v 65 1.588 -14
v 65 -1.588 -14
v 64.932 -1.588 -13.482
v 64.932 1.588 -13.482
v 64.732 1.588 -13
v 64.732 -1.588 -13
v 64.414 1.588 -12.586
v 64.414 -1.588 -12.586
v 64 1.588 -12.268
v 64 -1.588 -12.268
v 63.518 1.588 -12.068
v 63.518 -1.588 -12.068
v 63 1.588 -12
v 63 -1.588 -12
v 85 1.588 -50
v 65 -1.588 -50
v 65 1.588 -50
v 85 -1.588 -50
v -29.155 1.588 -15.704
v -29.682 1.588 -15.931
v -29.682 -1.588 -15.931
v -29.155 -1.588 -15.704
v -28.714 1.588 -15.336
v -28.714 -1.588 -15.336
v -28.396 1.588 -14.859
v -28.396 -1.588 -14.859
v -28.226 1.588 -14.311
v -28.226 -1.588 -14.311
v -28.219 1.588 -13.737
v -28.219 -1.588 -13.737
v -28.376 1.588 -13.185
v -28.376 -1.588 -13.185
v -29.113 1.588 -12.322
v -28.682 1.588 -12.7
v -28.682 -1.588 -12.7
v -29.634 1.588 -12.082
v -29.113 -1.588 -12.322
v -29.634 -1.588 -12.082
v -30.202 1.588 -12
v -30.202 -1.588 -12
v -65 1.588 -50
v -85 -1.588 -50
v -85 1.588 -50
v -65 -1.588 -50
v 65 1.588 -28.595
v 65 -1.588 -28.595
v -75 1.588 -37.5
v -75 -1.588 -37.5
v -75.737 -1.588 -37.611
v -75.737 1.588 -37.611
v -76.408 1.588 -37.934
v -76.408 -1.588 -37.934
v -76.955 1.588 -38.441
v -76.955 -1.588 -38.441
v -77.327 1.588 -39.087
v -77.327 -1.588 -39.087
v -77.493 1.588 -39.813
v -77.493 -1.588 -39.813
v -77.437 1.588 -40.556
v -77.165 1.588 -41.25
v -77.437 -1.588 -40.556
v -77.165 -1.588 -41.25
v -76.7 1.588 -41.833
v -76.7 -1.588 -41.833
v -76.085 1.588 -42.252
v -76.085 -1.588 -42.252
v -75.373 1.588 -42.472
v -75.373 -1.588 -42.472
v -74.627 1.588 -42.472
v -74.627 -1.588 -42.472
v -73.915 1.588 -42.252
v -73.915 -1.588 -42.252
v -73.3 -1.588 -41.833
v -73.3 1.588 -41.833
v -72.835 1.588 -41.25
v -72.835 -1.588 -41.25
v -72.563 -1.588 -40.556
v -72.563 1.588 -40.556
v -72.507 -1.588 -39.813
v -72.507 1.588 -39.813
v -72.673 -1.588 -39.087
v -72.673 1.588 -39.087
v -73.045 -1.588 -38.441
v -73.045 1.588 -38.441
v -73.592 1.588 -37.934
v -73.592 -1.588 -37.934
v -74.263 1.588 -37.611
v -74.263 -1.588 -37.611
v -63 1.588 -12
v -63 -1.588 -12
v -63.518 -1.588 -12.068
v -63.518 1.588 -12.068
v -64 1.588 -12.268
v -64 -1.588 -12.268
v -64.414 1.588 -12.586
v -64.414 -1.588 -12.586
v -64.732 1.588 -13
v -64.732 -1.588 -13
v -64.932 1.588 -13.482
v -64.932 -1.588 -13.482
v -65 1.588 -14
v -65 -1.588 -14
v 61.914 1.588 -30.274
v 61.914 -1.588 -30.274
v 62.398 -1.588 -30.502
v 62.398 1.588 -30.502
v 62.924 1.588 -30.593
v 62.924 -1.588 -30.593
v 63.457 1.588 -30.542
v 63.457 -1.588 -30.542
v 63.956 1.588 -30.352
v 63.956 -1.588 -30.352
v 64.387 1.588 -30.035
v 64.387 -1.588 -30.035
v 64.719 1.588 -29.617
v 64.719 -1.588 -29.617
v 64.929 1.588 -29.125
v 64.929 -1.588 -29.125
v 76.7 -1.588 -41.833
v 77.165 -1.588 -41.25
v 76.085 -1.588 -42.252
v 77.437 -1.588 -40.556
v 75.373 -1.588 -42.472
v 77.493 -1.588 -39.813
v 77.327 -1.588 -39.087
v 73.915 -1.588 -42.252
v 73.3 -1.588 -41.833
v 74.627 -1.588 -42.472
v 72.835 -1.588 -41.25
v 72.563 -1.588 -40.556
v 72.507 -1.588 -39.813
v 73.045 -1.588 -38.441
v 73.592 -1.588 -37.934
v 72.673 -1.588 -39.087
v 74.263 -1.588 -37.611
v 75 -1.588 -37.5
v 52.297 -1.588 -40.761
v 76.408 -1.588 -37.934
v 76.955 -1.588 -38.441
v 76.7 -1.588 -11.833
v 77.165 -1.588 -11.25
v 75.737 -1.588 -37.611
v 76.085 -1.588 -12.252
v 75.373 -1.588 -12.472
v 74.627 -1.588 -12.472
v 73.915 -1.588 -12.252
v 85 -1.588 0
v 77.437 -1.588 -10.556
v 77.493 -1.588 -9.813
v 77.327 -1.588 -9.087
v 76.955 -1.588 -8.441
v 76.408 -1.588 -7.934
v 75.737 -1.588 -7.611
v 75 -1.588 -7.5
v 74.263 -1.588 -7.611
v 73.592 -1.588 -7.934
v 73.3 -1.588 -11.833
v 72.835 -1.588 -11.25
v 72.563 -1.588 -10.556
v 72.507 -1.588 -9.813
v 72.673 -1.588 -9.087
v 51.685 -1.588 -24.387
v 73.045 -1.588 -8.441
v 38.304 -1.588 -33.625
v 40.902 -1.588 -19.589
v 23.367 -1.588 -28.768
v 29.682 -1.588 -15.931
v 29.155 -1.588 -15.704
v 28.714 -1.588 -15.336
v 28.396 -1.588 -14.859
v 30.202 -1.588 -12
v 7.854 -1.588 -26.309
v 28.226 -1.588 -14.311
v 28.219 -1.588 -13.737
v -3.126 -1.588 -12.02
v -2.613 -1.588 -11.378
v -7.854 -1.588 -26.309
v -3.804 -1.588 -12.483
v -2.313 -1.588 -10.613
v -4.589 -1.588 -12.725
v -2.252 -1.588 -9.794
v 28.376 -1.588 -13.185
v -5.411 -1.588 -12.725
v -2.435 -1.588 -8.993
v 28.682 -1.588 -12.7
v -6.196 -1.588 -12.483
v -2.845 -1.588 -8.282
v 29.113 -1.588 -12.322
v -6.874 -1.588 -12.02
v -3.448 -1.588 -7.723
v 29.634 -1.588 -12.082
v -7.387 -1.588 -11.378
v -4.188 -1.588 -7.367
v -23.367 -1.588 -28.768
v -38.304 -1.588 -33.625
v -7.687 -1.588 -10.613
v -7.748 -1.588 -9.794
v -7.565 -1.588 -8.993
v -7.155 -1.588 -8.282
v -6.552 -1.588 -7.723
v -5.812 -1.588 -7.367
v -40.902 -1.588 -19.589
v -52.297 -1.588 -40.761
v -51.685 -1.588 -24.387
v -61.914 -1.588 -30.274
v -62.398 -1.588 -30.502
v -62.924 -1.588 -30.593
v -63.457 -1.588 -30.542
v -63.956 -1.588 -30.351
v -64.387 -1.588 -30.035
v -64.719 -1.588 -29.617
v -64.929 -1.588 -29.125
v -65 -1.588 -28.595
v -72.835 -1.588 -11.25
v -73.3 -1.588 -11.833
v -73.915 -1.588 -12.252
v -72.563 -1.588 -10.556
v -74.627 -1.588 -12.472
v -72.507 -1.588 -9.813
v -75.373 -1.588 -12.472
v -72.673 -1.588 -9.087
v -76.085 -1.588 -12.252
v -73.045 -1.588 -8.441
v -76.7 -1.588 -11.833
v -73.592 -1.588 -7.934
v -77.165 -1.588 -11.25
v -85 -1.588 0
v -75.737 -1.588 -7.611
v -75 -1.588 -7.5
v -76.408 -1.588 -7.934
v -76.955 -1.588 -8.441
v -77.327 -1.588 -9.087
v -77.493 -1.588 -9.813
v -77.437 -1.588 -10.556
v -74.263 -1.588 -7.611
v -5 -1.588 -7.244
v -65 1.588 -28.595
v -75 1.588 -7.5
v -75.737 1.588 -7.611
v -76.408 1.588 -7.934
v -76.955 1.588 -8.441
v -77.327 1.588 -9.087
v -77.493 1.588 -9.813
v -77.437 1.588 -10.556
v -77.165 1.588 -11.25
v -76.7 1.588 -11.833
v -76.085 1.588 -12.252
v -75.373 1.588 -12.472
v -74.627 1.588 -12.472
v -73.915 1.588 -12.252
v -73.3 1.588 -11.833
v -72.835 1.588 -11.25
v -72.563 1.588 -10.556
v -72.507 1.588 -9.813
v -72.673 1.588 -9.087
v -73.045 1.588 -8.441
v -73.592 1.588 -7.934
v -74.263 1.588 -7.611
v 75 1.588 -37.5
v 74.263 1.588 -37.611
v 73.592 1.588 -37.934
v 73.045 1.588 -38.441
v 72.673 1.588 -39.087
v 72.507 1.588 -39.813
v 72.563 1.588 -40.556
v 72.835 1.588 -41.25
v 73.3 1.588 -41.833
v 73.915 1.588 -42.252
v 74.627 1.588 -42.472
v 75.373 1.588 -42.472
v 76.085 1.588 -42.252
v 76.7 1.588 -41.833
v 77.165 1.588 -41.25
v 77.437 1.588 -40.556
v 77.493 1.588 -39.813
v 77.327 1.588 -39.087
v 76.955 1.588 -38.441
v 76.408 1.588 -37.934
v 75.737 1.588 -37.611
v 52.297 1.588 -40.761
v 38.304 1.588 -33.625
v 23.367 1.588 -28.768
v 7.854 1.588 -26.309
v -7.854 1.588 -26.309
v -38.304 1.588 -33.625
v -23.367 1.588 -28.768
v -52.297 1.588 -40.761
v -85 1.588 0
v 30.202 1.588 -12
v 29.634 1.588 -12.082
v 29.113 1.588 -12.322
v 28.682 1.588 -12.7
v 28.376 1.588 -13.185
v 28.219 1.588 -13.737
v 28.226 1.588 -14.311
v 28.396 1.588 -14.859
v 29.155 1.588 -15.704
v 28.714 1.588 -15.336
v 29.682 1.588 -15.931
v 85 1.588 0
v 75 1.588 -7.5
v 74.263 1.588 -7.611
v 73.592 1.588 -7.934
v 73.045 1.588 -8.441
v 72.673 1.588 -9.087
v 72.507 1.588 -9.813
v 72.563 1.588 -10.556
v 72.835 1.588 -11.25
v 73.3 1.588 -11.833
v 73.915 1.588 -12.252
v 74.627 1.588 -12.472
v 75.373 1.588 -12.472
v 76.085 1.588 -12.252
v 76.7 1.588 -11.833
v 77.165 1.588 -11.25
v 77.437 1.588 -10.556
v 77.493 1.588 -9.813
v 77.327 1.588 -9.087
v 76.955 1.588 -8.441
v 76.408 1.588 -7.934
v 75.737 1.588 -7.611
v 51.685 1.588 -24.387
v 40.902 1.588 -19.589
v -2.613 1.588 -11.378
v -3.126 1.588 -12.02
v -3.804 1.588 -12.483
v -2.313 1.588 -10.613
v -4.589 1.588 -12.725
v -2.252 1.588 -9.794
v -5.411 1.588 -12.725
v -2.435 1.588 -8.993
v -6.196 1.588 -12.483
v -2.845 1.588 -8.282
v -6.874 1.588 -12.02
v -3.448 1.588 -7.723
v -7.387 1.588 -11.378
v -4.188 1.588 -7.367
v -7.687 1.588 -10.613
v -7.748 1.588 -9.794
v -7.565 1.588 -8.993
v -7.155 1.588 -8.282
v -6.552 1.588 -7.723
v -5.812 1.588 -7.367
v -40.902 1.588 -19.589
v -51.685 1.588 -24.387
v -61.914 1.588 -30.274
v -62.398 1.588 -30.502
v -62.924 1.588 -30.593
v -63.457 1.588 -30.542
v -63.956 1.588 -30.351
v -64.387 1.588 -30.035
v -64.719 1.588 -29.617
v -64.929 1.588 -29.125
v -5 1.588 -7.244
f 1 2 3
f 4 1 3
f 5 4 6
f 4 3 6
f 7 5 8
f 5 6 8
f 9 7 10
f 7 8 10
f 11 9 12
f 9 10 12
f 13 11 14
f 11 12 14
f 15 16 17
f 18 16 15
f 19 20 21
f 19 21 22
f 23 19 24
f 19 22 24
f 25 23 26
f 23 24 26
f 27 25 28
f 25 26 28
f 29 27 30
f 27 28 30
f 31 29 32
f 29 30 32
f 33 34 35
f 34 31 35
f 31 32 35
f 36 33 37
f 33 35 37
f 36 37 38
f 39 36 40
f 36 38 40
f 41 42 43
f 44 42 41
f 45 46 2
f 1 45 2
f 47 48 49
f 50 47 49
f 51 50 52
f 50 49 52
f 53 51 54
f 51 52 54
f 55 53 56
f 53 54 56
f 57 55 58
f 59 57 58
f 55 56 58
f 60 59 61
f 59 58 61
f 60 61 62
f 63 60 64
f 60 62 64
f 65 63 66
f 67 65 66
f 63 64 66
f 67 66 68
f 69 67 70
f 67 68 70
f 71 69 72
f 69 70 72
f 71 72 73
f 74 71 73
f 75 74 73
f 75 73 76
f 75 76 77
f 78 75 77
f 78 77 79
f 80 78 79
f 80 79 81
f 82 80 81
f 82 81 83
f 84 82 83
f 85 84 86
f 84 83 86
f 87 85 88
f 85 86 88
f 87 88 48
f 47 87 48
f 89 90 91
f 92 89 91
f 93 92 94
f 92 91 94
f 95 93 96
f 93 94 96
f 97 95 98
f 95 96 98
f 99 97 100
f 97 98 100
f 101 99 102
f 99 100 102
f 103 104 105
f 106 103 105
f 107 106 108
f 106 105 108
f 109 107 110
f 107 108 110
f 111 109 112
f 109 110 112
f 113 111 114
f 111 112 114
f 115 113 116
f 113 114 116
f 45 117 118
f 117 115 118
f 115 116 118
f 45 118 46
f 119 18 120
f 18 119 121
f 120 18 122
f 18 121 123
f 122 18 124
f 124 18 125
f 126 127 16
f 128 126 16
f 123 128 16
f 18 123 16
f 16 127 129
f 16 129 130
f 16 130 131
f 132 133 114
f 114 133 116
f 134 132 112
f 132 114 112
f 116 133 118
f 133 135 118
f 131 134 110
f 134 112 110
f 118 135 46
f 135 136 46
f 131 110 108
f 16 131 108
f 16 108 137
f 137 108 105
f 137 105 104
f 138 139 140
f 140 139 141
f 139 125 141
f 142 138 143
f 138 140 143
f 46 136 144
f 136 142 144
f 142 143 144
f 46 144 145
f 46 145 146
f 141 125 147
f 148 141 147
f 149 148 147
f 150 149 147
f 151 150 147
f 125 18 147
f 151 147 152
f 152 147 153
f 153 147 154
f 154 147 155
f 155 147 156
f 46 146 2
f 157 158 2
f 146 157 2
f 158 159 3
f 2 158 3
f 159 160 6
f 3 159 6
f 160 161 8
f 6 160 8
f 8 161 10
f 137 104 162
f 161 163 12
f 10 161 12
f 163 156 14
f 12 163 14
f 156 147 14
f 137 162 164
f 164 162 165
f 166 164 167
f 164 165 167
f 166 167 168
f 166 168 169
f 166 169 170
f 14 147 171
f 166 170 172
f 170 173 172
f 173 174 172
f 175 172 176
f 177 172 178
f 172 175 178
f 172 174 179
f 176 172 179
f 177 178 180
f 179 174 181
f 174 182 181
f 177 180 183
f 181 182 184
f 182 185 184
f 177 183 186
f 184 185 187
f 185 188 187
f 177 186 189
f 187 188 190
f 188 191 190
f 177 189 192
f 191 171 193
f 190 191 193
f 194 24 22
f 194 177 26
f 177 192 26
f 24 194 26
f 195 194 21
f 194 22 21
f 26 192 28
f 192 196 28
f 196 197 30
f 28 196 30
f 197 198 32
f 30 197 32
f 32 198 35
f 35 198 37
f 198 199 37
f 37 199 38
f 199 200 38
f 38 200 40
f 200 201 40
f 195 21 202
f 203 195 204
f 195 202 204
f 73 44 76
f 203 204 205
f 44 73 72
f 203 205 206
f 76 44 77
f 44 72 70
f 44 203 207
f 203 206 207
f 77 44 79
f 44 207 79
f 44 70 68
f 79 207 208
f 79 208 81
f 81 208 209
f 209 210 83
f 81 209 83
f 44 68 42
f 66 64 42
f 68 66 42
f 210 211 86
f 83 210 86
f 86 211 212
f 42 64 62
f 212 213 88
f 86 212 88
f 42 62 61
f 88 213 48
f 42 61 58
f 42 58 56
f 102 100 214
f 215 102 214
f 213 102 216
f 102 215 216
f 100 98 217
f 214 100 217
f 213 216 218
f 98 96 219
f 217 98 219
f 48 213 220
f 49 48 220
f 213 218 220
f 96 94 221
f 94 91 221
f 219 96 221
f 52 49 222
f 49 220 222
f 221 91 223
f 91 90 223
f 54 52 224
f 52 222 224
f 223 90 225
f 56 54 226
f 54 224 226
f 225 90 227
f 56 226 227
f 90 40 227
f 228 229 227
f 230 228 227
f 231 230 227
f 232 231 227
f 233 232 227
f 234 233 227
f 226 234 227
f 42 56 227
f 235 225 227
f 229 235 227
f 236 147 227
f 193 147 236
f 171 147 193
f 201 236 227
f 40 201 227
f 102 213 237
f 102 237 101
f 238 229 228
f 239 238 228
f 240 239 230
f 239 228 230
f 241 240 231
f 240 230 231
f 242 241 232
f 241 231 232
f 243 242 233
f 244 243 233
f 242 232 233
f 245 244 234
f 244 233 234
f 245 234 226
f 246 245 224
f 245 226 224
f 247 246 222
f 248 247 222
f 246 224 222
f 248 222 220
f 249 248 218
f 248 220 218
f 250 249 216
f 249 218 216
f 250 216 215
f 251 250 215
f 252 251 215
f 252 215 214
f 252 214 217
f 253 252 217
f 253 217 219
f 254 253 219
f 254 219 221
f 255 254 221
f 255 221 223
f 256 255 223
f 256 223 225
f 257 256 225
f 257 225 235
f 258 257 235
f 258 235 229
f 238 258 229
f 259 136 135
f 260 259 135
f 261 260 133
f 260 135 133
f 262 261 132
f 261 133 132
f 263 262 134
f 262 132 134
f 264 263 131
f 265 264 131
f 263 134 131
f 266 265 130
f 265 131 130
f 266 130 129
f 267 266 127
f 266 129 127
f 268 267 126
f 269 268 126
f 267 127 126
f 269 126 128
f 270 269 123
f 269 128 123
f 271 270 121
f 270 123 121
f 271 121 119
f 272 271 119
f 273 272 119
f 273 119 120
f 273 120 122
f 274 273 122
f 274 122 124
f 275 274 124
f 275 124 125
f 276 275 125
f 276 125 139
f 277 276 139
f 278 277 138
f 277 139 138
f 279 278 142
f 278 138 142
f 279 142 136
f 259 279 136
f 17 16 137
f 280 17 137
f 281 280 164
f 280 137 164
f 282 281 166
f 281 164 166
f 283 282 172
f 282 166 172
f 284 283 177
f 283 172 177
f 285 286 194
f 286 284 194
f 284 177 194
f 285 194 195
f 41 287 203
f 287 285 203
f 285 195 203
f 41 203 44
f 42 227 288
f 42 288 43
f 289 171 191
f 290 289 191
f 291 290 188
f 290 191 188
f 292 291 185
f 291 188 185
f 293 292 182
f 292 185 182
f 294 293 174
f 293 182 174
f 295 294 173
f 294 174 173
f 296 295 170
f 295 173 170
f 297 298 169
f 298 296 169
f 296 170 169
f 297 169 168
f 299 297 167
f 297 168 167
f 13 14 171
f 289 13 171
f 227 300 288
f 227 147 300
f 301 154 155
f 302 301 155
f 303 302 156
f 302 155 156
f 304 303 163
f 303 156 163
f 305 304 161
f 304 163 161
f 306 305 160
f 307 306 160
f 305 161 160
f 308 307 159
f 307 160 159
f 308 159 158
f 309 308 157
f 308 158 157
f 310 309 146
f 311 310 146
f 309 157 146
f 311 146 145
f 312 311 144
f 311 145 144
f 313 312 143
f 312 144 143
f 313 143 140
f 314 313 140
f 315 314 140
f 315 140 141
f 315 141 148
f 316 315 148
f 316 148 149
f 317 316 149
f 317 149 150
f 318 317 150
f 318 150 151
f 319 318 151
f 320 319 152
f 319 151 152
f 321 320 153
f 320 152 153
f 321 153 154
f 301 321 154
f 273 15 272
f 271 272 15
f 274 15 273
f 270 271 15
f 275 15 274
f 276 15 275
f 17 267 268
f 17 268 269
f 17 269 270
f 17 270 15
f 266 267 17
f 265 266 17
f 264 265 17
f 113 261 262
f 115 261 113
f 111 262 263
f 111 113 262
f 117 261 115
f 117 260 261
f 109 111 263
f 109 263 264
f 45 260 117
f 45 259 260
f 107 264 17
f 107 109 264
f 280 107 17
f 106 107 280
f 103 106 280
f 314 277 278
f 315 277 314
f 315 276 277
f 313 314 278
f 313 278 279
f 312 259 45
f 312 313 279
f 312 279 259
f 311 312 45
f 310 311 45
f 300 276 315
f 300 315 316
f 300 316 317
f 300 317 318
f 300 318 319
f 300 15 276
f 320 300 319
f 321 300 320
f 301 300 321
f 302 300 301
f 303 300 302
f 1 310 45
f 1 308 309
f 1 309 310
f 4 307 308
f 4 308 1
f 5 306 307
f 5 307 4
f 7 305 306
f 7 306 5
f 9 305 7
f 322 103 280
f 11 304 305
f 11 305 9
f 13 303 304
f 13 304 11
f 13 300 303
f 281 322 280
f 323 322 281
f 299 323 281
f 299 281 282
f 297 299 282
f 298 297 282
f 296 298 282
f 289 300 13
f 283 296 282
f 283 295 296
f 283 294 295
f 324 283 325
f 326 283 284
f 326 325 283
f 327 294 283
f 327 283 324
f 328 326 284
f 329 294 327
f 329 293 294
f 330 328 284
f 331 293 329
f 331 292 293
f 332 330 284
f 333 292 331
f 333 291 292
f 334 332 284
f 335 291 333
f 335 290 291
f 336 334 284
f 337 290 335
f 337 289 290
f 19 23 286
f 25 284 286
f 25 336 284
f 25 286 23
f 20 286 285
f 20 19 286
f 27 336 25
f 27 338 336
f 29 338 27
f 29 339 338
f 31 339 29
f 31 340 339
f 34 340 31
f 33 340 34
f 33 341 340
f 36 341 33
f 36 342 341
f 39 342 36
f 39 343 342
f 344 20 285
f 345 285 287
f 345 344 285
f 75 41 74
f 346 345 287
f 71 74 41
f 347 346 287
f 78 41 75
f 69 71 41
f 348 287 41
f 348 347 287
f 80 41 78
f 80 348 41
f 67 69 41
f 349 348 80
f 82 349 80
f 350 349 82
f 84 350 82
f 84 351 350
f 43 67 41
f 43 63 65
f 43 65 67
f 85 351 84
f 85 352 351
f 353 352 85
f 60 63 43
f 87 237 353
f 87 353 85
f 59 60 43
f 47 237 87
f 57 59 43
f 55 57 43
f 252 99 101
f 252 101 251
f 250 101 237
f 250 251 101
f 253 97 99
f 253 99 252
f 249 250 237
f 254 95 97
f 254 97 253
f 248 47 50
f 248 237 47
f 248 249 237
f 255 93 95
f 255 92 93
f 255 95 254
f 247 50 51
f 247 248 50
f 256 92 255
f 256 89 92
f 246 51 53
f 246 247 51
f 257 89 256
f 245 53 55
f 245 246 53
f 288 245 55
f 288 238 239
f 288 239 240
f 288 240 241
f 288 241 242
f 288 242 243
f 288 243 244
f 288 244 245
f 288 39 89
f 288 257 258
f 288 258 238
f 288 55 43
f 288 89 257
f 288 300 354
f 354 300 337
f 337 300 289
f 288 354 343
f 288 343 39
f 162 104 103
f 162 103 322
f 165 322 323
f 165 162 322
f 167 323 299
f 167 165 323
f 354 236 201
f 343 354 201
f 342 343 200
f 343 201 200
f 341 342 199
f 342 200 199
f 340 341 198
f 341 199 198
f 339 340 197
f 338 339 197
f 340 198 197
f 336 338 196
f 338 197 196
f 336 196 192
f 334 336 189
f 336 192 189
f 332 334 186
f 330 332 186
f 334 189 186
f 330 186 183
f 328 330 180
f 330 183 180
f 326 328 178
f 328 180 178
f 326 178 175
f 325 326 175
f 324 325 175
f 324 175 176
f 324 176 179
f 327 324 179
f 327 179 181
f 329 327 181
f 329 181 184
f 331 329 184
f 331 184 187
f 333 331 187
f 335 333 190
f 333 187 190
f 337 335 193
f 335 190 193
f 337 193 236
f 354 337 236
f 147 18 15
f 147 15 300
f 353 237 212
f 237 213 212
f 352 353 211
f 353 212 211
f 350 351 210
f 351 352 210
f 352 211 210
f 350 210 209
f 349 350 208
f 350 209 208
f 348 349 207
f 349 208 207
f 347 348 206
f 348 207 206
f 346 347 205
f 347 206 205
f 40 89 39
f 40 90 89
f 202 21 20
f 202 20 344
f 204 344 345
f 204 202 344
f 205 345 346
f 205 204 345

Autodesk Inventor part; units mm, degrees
ref_plane "YZ Plane" through (0, 0, 0) normal (1, 0, 0) x (0, 1, 0)
ref_plane "XZ Plane" through (0, 0, 0) normal (0, 1, 0) x (-1, 0, 0)
ref_plane "XY Plane" through (0, 0, 0) normal (0, 0, 1) x (1, 0, 0)
sketch "Sketch1" plane through (0, 0, 0) normal (0, 1, 0) x (-1, 0, 0)
  line L0 (85, -50) -> (65, -50)
  line L1 (-85, -50) -> (-85, 0)
  line L2 (-85, 0) -> (85, 0)
  line L3 (85, 0) -> (85, -50)
  line L4 (85, -50) -> (-85, 0) construction
  line L5 (-85, -50) -> (85, 0) construction
  arc A0 (65, -50) -> (-65, -50) centre (0, -126.0208) ccw
  line L6 (65, -50) -> (-65, -50) construction
  line L7 (-65, -50) -> (-85, -50)
  line L8 (65, -28.5948) -> (65, -14)
  line L9 (63, -12) -> (30.2021, -12)
  arc A1 (61.914, -30.2742) -> (29.6815, -15.931) centre (0, -126.0208) ccw
  line L10 (0, 0) -> (0, -25)
  arc A2 (30.2021, -12) -> (29.6815, -15.931) centre (30.2021, -14) ccw
  arc A3 (65, -14) -> (63, -12) centre (63, -14) ccw
  arc A4 (61.914, -30.2742) -> (65, -28.5948) centre (63, -28.5948) ccw
  line L11 (-65, -28.5948) -> (-65, -14)
  line L12 (-63, -12) -> (-30.2021, -12)
  arc A5 (-29.6815, -15.931) -> (-61.914, -30.2742) centre (0, -126.0208) ccw
  arc A6 (-29.6815, -15.931) -> (-30.2021, -12) centre (-30.2021, -14) ccw
  arc A7 (-63, -12) -> (-65, -14) centre (-63, -14) ccw
  arc A8 (-65, -28.5948) -> (-61.914, -30.2742) centre (-63, -28.5948) ccw
  point P0 (0, -25)
  point P1 (0, -25)
  point P2 (65, -32.3419)
  point P3 (0, -12)
  dimension "d0" = 170
  dimension "d1" = 50
  dimension "d2" = 26
  dimension "d3" = 20
  dimension "d4" = 12
  dimension "d5" = 20
  dimension "d6" = 2
extrude "Extrusion1" add sketch "Sketch1" along normal mid plane 3.175
sketch "Sketch2" plane through (0, 1.5875, 0) normal (0, 1, 0) x (1, 0, 0)
  line L0 (-85, 0) -> (85, 0) projected
  line L1 (-85, 50) -> (-85, 0) projected
  line L2 (-65, 50) -> (-85, 50) projected
  line L3 (0, 0) -> (0, 15.0505)
  point P0 (-75, 10)
  point P1 (-75, 40)
  point P2 (75, 10)
  point P3 (75, 40)
  dimension "d9" = 10
  dimension "d10" = 10
  dimension "d11" = 10
hole "Hole1" at (-75, 1.5875, -10) at (-75, 1.5875, -40) at (75, 1.5875, -40) at (75, 1.5875, -10) direction (0, -1, 0) diameter 5 end through all clearance for "Flat Head Machine Screw" size "M5" standard "Ansi Metric M Profile"
sketch "Sketch4" plane through (0, 1.5875, 0) normal (0, 1, 0) x (1, 0, 0)
  line L0 (-85, 50) -> (-85, 0) projected
  arc A0 (-30.2021, 12) -> (-29.6815, 15.931) centre (-30.2021, 14) ccw projected
  line L1 (-85, 0) -> (85, 0) projected
  point P0 (0, 0)
  point P1 (-5, 10)
  dimension "d29" = 80
  dimension "d37" = 10
hole "Hole3" at (-5, 1.5875, -10) direction (0, -1, 0) diameter 5.5118 depth 14.2 tip angle 118 clearance for "Socket Head Cap Screw" size "M5" standard "Ansi Metric M Profile"
properties part number "Upper Cross Bracket" material "Aluminum 6061"
